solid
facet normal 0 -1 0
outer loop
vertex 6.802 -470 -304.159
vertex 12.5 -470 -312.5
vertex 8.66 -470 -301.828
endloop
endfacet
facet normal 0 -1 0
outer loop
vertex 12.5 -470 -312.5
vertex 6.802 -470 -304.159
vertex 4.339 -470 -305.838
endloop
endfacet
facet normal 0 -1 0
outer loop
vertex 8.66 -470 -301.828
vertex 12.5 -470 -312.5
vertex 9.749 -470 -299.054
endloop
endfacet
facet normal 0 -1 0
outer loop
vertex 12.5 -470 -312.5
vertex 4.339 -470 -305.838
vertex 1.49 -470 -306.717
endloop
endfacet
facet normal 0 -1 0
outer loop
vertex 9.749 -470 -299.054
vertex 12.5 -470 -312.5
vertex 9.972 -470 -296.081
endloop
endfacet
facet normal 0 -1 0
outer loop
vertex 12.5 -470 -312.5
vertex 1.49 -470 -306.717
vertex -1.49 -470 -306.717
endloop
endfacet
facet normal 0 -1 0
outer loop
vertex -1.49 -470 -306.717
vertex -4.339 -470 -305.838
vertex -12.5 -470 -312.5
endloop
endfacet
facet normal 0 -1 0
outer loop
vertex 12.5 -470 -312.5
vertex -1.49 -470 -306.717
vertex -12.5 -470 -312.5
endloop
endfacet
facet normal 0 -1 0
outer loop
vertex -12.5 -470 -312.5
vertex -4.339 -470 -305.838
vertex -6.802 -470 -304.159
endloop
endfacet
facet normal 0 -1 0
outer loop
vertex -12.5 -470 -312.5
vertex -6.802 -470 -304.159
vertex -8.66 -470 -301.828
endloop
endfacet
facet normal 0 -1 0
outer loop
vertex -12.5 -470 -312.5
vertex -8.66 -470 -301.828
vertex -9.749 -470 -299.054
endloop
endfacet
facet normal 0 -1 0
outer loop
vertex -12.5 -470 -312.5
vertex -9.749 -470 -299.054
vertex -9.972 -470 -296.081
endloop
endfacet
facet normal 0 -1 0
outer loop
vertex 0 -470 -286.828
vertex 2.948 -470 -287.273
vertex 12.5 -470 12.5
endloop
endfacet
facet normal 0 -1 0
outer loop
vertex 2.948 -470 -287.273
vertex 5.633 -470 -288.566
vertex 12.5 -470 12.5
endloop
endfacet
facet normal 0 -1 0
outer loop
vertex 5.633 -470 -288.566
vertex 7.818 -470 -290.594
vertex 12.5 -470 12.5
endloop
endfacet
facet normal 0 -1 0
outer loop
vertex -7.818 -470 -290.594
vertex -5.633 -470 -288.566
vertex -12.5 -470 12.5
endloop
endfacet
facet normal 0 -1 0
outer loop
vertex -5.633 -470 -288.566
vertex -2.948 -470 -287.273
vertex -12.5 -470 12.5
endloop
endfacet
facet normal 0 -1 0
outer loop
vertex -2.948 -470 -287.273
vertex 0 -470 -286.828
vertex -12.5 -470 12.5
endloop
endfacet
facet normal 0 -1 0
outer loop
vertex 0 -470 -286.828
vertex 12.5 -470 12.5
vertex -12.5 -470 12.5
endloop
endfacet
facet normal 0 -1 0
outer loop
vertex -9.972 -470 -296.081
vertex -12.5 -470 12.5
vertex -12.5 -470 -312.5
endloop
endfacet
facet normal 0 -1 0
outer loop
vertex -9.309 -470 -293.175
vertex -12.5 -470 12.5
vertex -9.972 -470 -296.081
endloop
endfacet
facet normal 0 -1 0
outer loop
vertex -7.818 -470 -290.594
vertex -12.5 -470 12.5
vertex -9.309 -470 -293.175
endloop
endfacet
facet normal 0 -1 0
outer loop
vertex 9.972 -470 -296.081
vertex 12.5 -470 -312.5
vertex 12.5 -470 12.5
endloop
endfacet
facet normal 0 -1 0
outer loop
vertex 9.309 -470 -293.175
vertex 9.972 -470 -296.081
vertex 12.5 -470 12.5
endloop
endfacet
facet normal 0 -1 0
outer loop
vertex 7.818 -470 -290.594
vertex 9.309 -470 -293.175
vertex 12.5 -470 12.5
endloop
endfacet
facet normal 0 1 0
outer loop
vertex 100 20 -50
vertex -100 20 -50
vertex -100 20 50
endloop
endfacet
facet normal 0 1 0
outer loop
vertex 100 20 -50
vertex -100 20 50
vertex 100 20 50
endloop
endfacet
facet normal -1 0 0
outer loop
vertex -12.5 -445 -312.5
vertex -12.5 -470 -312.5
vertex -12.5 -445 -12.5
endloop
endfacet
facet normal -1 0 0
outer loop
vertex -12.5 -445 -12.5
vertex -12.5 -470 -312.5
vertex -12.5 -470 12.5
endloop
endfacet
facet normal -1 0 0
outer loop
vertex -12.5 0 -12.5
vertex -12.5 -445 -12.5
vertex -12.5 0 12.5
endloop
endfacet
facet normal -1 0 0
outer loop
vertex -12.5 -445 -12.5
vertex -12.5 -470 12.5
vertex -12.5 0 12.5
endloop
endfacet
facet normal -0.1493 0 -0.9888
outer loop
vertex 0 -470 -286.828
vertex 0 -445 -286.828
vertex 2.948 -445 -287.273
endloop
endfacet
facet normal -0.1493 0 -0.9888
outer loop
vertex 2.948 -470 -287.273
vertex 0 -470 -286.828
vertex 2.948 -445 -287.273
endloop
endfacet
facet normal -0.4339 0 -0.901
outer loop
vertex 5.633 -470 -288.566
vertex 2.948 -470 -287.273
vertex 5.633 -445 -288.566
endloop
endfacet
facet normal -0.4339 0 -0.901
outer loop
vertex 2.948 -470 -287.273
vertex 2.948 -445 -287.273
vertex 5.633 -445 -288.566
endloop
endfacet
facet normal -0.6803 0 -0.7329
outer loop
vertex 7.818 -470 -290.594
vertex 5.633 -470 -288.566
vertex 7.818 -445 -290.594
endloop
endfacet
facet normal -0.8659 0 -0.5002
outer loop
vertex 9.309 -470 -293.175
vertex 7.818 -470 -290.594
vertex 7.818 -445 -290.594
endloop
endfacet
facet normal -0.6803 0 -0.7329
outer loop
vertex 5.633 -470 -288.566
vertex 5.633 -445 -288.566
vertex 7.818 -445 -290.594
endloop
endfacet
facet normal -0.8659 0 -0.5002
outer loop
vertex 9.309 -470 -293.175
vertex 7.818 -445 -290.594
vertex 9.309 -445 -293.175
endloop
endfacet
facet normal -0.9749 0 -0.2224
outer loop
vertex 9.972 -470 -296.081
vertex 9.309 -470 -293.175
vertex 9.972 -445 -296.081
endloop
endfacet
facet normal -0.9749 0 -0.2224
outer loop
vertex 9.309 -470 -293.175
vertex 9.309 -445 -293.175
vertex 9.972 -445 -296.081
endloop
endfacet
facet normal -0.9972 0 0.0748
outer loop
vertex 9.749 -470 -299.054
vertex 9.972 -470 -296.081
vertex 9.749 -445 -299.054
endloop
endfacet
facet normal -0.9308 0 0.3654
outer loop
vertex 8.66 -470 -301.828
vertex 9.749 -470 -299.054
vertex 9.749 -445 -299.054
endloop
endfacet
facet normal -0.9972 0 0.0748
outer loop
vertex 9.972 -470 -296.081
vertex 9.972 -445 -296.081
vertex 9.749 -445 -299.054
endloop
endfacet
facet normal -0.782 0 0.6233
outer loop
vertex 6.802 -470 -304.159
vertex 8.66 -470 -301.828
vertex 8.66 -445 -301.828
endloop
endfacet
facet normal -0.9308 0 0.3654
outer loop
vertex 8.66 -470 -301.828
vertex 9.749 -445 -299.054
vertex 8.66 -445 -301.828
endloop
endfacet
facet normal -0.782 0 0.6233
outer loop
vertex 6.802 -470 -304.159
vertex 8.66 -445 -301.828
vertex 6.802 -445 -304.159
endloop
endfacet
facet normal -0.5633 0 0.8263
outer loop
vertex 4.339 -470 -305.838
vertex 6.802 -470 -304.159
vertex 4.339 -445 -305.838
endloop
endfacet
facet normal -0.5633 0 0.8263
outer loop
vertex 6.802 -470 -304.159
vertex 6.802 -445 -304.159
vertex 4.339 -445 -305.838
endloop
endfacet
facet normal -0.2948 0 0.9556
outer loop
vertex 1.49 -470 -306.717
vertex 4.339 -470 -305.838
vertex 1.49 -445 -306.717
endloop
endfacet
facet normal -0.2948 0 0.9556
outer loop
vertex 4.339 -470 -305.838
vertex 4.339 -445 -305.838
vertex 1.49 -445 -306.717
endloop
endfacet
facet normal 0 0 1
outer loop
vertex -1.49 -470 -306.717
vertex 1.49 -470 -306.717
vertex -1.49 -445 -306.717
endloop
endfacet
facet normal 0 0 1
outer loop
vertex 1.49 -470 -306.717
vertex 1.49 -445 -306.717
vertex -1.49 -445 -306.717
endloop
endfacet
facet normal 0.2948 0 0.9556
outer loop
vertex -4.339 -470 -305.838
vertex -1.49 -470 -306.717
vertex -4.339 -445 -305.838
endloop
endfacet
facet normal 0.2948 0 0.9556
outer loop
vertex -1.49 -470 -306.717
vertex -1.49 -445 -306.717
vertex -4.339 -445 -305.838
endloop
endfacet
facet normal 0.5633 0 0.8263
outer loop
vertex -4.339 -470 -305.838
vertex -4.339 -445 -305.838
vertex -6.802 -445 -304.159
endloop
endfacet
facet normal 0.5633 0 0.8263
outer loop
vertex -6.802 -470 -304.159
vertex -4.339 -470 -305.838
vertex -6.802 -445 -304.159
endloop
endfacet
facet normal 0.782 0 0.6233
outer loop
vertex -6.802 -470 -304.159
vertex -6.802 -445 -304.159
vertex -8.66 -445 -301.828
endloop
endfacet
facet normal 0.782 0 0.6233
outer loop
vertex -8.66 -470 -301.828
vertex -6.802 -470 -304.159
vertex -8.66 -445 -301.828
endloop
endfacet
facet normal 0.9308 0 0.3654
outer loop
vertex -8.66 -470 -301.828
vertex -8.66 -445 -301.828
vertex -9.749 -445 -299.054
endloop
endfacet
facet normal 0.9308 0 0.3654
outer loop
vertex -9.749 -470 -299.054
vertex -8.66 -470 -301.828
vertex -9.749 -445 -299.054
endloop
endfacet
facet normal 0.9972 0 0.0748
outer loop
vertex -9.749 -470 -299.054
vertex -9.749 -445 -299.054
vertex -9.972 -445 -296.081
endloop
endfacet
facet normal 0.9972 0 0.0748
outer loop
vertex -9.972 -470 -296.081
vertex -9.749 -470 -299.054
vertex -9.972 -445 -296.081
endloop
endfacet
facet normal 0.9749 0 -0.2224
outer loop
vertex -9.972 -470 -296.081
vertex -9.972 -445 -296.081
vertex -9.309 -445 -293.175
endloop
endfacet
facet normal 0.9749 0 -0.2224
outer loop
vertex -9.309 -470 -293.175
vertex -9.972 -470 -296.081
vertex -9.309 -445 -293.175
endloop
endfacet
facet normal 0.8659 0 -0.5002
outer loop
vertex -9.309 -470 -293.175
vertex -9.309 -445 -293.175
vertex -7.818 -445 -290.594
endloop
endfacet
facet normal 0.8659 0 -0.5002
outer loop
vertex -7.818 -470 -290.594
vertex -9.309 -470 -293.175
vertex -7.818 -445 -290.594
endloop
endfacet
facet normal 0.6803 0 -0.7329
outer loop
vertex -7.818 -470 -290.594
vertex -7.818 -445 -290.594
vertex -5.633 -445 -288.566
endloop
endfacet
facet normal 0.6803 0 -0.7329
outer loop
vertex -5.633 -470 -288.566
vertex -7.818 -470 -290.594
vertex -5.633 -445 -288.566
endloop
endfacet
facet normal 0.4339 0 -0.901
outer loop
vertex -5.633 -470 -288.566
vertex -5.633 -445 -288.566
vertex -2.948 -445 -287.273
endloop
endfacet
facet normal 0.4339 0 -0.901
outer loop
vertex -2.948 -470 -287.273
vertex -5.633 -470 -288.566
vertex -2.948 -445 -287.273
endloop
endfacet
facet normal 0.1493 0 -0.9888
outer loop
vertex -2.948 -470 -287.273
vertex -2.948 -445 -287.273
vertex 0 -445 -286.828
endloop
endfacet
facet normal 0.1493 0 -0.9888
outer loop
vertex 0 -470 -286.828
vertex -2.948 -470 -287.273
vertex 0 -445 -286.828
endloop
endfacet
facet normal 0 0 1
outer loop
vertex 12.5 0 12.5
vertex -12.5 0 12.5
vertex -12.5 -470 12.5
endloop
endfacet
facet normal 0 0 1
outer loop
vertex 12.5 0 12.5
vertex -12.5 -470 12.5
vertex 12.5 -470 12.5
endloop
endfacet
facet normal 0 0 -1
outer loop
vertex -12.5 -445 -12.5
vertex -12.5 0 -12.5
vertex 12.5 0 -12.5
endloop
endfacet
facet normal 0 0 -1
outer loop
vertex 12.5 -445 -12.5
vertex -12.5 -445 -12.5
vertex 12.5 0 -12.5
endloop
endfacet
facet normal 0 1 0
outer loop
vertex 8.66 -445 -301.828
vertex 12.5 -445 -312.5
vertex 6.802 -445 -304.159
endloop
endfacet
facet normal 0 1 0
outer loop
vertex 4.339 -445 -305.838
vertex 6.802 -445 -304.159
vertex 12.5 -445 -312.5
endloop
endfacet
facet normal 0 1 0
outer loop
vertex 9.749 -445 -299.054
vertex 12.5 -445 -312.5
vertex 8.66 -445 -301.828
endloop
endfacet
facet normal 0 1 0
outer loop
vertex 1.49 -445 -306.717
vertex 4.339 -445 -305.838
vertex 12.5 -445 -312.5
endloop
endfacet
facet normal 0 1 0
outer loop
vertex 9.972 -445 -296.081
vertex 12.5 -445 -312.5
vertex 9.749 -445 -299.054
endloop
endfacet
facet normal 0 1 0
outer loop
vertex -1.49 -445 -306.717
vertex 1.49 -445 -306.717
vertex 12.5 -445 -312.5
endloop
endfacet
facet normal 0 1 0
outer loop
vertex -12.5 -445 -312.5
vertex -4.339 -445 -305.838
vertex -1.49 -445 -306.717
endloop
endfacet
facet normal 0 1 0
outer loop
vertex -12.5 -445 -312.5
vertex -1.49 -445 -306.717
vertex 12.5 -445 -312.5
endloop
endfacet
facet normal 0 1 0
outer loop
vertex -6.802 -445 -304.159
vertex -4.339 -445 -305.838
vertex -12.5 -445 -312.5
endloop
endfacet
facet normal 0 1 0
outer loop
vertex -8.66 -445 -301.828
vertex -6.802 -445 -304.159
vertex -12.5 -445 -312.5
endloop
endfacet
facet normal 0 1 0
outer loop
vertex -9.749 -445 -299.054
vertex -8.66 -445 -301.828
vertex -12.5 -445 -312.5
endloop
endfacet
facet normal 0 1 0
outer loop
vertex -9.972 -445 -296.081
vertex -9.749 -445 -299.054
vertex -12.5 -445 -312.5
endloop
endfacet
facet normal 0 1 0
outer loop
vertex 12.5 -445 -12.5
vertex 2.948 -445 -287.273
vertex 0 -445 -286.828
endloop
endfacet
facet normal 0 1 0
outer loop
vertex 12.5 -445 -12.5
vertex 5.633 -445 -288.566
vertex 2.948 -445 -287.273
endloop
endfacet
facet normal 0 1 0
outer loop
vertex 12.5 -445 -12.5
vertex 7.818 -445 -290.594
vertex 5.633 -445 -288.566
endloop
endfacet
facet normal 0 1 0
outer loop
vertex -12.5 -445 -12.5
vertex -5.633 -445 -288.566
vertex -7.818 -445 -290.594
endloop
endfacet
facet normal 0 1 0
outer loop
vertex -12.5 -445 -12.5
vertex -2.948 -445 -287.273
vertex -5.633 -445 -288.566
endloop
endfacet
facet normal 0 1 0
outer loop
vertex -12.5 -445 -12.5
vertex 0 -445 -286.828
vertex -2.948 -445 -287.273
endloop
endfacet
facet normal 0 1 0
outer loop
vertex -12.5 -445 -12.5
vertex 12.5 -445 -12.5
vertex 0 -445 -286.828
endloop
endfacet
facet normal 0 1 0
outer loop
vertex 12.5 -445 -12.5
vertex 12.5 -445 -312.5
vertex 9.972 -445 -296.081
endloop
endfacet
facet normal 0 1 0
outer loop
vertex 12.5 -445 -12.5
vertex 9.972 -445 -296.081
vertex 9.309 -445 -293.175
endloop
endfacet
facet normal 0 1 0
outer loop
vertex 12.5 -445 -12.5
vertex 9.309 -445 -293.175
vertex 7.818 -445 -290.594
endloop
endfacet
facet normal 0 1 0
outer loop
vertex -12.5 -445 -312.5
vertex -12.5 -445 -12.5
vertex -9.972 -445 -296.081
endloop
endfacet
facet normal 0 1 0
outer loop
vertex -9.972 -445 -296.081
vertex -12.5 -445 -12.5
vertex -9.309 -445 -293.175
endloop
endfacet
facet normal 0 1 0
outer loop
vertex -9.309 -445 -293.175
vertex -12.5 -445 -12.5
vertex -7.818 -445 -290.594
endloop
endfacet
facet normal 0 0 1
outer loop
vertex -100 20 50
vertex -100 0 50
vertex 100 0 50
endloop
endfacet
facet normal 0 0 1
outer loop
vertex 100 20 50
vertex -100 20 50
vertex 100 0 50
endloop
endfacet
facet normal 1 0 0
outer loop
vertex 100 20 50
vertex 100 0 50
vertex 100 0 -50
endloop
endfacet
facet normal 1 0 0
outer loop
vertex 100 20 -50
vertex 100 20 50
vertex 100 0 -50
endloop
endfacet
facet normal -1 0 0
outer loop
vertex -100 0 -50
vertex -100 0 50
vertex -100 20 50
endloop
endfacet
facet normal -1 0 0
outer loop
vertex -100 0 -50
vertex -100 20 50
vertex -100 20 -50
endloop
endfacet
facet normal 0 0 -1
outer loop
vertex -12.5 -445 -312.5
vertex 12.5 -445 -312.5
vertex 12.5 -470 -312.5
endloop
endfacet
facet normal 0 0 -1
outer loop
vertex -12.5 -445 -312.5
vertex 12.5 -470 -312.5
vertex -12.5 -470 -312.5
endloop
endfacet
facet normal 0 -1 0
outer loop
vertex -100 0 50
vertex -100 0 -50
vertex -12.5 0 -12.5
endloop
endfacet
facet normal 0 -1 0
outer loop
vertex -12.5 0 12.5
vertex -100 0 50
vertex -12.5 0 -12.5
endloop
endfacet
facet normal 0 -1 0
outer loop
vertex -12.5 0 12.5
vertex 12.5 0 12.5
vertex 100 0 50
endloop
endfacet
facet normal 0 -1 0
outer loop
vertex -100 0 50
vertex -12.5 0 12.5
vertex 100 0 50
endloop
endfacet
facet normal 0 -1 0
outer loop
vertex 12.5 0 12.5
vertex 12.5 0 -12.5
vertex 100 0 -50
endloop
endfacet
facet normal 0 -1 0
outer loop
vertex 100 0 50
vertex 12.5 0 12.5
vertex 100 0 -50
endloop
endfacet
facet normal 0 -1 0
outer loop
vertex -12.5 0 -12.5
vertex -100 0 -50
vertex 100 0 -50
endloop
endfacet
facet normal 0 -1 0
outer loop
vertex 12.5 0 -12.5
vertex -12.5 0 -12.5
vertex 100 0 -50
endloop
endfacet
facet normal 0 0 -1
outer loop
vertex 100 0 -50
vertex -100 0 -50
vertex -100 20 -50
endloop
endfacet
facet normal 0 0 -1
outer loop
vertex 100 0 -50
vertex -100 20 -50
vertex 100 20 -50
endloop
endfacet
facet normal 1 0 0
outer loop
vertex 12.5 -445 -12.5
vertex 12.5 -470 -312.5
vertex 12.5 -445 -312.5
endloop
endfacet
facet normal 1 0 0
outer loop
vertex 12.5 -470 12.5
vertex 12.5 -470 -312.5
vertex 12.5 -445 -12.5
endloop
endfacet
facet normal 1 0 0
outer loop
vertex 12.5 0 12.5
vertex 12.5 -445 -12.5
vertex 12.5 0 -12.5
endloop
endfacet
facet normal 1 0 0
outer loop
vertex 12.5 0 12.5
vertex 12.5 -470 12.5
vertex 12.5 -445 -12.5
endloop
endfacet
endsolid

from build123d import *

# Parameters (mm, degrees)
ESQUISSE1_W             = 200
ESQUISSE1_H             = 100
BOSS_EXTRU_1_DEPTH      = 20
ESQUISSE2_W             = 25
ESQUISSE2_H             = 25
BOSS_EXTRU_2_DEPTH      = 470
ESQUISSE6_W             = 25
ESQUISSE6_H             = 25
BOSS_EXTRU_3_DEPTH      = 300
ESQUISSE9_R             = 10
ENL_V_MAT_EXTRU_1_DEPTH = 30


with BuildPart() as part:
    # Esquisse1 → Boss.-Extru.1 (new body)
    with BuildSketch(Plane(origin=(0, 0, 0), x_dir=(1, 0, 0), z_dir=(0, 1, 0))):
        Rectangle(ESQUISSE1_W, ESQUISSE1_H)
    extrude(amount=BOSS_EXTRU_1_DEPTH)

    # Esquisse2 → Boss.-Extru.2 (add)
    with BuildSketch(Plane(origin=(0, 0, 0), x_dir=(1, 0, 0), z_dir=(0, 1, 0))):
        Rectangle(ESQUISSE2_W, ESQUISSE2_H)
    extrude(amount=-BOSS_EXTRU_2_DEPTH)

    # Esquisse6 → Boss.-Extru.3 (add)
    with BuildSketch(Plane(origin=(0, 0, -12.5), x_dir=(-1, 0, 0), z_dir=(0, 0, -1))):
        with Locations((0, -457.5)):
            Rectangle(ESQUISSE6_W, ESQUISSE6_H)
    extrude(amount=BOSS_EXTRU_3_DEPTH)

    # Esquisse9 → Enlèv. mat.-Extru.1 (cut)
    with BuildSketch(Plane(origin=(0, -445, 0), x_dir=(1, 0, 0), z_dir=(0, 1, 0))):
        with Locations(Location((0, 296.828421152, 0), (0, 0, 270))):
            Circle(ESQUISSE9_R)
    extrude(amount=-ENL_V_MAT_EXTRU_1_DEPTH, mode=Mode.SUBTRACT)


solid = part.part
